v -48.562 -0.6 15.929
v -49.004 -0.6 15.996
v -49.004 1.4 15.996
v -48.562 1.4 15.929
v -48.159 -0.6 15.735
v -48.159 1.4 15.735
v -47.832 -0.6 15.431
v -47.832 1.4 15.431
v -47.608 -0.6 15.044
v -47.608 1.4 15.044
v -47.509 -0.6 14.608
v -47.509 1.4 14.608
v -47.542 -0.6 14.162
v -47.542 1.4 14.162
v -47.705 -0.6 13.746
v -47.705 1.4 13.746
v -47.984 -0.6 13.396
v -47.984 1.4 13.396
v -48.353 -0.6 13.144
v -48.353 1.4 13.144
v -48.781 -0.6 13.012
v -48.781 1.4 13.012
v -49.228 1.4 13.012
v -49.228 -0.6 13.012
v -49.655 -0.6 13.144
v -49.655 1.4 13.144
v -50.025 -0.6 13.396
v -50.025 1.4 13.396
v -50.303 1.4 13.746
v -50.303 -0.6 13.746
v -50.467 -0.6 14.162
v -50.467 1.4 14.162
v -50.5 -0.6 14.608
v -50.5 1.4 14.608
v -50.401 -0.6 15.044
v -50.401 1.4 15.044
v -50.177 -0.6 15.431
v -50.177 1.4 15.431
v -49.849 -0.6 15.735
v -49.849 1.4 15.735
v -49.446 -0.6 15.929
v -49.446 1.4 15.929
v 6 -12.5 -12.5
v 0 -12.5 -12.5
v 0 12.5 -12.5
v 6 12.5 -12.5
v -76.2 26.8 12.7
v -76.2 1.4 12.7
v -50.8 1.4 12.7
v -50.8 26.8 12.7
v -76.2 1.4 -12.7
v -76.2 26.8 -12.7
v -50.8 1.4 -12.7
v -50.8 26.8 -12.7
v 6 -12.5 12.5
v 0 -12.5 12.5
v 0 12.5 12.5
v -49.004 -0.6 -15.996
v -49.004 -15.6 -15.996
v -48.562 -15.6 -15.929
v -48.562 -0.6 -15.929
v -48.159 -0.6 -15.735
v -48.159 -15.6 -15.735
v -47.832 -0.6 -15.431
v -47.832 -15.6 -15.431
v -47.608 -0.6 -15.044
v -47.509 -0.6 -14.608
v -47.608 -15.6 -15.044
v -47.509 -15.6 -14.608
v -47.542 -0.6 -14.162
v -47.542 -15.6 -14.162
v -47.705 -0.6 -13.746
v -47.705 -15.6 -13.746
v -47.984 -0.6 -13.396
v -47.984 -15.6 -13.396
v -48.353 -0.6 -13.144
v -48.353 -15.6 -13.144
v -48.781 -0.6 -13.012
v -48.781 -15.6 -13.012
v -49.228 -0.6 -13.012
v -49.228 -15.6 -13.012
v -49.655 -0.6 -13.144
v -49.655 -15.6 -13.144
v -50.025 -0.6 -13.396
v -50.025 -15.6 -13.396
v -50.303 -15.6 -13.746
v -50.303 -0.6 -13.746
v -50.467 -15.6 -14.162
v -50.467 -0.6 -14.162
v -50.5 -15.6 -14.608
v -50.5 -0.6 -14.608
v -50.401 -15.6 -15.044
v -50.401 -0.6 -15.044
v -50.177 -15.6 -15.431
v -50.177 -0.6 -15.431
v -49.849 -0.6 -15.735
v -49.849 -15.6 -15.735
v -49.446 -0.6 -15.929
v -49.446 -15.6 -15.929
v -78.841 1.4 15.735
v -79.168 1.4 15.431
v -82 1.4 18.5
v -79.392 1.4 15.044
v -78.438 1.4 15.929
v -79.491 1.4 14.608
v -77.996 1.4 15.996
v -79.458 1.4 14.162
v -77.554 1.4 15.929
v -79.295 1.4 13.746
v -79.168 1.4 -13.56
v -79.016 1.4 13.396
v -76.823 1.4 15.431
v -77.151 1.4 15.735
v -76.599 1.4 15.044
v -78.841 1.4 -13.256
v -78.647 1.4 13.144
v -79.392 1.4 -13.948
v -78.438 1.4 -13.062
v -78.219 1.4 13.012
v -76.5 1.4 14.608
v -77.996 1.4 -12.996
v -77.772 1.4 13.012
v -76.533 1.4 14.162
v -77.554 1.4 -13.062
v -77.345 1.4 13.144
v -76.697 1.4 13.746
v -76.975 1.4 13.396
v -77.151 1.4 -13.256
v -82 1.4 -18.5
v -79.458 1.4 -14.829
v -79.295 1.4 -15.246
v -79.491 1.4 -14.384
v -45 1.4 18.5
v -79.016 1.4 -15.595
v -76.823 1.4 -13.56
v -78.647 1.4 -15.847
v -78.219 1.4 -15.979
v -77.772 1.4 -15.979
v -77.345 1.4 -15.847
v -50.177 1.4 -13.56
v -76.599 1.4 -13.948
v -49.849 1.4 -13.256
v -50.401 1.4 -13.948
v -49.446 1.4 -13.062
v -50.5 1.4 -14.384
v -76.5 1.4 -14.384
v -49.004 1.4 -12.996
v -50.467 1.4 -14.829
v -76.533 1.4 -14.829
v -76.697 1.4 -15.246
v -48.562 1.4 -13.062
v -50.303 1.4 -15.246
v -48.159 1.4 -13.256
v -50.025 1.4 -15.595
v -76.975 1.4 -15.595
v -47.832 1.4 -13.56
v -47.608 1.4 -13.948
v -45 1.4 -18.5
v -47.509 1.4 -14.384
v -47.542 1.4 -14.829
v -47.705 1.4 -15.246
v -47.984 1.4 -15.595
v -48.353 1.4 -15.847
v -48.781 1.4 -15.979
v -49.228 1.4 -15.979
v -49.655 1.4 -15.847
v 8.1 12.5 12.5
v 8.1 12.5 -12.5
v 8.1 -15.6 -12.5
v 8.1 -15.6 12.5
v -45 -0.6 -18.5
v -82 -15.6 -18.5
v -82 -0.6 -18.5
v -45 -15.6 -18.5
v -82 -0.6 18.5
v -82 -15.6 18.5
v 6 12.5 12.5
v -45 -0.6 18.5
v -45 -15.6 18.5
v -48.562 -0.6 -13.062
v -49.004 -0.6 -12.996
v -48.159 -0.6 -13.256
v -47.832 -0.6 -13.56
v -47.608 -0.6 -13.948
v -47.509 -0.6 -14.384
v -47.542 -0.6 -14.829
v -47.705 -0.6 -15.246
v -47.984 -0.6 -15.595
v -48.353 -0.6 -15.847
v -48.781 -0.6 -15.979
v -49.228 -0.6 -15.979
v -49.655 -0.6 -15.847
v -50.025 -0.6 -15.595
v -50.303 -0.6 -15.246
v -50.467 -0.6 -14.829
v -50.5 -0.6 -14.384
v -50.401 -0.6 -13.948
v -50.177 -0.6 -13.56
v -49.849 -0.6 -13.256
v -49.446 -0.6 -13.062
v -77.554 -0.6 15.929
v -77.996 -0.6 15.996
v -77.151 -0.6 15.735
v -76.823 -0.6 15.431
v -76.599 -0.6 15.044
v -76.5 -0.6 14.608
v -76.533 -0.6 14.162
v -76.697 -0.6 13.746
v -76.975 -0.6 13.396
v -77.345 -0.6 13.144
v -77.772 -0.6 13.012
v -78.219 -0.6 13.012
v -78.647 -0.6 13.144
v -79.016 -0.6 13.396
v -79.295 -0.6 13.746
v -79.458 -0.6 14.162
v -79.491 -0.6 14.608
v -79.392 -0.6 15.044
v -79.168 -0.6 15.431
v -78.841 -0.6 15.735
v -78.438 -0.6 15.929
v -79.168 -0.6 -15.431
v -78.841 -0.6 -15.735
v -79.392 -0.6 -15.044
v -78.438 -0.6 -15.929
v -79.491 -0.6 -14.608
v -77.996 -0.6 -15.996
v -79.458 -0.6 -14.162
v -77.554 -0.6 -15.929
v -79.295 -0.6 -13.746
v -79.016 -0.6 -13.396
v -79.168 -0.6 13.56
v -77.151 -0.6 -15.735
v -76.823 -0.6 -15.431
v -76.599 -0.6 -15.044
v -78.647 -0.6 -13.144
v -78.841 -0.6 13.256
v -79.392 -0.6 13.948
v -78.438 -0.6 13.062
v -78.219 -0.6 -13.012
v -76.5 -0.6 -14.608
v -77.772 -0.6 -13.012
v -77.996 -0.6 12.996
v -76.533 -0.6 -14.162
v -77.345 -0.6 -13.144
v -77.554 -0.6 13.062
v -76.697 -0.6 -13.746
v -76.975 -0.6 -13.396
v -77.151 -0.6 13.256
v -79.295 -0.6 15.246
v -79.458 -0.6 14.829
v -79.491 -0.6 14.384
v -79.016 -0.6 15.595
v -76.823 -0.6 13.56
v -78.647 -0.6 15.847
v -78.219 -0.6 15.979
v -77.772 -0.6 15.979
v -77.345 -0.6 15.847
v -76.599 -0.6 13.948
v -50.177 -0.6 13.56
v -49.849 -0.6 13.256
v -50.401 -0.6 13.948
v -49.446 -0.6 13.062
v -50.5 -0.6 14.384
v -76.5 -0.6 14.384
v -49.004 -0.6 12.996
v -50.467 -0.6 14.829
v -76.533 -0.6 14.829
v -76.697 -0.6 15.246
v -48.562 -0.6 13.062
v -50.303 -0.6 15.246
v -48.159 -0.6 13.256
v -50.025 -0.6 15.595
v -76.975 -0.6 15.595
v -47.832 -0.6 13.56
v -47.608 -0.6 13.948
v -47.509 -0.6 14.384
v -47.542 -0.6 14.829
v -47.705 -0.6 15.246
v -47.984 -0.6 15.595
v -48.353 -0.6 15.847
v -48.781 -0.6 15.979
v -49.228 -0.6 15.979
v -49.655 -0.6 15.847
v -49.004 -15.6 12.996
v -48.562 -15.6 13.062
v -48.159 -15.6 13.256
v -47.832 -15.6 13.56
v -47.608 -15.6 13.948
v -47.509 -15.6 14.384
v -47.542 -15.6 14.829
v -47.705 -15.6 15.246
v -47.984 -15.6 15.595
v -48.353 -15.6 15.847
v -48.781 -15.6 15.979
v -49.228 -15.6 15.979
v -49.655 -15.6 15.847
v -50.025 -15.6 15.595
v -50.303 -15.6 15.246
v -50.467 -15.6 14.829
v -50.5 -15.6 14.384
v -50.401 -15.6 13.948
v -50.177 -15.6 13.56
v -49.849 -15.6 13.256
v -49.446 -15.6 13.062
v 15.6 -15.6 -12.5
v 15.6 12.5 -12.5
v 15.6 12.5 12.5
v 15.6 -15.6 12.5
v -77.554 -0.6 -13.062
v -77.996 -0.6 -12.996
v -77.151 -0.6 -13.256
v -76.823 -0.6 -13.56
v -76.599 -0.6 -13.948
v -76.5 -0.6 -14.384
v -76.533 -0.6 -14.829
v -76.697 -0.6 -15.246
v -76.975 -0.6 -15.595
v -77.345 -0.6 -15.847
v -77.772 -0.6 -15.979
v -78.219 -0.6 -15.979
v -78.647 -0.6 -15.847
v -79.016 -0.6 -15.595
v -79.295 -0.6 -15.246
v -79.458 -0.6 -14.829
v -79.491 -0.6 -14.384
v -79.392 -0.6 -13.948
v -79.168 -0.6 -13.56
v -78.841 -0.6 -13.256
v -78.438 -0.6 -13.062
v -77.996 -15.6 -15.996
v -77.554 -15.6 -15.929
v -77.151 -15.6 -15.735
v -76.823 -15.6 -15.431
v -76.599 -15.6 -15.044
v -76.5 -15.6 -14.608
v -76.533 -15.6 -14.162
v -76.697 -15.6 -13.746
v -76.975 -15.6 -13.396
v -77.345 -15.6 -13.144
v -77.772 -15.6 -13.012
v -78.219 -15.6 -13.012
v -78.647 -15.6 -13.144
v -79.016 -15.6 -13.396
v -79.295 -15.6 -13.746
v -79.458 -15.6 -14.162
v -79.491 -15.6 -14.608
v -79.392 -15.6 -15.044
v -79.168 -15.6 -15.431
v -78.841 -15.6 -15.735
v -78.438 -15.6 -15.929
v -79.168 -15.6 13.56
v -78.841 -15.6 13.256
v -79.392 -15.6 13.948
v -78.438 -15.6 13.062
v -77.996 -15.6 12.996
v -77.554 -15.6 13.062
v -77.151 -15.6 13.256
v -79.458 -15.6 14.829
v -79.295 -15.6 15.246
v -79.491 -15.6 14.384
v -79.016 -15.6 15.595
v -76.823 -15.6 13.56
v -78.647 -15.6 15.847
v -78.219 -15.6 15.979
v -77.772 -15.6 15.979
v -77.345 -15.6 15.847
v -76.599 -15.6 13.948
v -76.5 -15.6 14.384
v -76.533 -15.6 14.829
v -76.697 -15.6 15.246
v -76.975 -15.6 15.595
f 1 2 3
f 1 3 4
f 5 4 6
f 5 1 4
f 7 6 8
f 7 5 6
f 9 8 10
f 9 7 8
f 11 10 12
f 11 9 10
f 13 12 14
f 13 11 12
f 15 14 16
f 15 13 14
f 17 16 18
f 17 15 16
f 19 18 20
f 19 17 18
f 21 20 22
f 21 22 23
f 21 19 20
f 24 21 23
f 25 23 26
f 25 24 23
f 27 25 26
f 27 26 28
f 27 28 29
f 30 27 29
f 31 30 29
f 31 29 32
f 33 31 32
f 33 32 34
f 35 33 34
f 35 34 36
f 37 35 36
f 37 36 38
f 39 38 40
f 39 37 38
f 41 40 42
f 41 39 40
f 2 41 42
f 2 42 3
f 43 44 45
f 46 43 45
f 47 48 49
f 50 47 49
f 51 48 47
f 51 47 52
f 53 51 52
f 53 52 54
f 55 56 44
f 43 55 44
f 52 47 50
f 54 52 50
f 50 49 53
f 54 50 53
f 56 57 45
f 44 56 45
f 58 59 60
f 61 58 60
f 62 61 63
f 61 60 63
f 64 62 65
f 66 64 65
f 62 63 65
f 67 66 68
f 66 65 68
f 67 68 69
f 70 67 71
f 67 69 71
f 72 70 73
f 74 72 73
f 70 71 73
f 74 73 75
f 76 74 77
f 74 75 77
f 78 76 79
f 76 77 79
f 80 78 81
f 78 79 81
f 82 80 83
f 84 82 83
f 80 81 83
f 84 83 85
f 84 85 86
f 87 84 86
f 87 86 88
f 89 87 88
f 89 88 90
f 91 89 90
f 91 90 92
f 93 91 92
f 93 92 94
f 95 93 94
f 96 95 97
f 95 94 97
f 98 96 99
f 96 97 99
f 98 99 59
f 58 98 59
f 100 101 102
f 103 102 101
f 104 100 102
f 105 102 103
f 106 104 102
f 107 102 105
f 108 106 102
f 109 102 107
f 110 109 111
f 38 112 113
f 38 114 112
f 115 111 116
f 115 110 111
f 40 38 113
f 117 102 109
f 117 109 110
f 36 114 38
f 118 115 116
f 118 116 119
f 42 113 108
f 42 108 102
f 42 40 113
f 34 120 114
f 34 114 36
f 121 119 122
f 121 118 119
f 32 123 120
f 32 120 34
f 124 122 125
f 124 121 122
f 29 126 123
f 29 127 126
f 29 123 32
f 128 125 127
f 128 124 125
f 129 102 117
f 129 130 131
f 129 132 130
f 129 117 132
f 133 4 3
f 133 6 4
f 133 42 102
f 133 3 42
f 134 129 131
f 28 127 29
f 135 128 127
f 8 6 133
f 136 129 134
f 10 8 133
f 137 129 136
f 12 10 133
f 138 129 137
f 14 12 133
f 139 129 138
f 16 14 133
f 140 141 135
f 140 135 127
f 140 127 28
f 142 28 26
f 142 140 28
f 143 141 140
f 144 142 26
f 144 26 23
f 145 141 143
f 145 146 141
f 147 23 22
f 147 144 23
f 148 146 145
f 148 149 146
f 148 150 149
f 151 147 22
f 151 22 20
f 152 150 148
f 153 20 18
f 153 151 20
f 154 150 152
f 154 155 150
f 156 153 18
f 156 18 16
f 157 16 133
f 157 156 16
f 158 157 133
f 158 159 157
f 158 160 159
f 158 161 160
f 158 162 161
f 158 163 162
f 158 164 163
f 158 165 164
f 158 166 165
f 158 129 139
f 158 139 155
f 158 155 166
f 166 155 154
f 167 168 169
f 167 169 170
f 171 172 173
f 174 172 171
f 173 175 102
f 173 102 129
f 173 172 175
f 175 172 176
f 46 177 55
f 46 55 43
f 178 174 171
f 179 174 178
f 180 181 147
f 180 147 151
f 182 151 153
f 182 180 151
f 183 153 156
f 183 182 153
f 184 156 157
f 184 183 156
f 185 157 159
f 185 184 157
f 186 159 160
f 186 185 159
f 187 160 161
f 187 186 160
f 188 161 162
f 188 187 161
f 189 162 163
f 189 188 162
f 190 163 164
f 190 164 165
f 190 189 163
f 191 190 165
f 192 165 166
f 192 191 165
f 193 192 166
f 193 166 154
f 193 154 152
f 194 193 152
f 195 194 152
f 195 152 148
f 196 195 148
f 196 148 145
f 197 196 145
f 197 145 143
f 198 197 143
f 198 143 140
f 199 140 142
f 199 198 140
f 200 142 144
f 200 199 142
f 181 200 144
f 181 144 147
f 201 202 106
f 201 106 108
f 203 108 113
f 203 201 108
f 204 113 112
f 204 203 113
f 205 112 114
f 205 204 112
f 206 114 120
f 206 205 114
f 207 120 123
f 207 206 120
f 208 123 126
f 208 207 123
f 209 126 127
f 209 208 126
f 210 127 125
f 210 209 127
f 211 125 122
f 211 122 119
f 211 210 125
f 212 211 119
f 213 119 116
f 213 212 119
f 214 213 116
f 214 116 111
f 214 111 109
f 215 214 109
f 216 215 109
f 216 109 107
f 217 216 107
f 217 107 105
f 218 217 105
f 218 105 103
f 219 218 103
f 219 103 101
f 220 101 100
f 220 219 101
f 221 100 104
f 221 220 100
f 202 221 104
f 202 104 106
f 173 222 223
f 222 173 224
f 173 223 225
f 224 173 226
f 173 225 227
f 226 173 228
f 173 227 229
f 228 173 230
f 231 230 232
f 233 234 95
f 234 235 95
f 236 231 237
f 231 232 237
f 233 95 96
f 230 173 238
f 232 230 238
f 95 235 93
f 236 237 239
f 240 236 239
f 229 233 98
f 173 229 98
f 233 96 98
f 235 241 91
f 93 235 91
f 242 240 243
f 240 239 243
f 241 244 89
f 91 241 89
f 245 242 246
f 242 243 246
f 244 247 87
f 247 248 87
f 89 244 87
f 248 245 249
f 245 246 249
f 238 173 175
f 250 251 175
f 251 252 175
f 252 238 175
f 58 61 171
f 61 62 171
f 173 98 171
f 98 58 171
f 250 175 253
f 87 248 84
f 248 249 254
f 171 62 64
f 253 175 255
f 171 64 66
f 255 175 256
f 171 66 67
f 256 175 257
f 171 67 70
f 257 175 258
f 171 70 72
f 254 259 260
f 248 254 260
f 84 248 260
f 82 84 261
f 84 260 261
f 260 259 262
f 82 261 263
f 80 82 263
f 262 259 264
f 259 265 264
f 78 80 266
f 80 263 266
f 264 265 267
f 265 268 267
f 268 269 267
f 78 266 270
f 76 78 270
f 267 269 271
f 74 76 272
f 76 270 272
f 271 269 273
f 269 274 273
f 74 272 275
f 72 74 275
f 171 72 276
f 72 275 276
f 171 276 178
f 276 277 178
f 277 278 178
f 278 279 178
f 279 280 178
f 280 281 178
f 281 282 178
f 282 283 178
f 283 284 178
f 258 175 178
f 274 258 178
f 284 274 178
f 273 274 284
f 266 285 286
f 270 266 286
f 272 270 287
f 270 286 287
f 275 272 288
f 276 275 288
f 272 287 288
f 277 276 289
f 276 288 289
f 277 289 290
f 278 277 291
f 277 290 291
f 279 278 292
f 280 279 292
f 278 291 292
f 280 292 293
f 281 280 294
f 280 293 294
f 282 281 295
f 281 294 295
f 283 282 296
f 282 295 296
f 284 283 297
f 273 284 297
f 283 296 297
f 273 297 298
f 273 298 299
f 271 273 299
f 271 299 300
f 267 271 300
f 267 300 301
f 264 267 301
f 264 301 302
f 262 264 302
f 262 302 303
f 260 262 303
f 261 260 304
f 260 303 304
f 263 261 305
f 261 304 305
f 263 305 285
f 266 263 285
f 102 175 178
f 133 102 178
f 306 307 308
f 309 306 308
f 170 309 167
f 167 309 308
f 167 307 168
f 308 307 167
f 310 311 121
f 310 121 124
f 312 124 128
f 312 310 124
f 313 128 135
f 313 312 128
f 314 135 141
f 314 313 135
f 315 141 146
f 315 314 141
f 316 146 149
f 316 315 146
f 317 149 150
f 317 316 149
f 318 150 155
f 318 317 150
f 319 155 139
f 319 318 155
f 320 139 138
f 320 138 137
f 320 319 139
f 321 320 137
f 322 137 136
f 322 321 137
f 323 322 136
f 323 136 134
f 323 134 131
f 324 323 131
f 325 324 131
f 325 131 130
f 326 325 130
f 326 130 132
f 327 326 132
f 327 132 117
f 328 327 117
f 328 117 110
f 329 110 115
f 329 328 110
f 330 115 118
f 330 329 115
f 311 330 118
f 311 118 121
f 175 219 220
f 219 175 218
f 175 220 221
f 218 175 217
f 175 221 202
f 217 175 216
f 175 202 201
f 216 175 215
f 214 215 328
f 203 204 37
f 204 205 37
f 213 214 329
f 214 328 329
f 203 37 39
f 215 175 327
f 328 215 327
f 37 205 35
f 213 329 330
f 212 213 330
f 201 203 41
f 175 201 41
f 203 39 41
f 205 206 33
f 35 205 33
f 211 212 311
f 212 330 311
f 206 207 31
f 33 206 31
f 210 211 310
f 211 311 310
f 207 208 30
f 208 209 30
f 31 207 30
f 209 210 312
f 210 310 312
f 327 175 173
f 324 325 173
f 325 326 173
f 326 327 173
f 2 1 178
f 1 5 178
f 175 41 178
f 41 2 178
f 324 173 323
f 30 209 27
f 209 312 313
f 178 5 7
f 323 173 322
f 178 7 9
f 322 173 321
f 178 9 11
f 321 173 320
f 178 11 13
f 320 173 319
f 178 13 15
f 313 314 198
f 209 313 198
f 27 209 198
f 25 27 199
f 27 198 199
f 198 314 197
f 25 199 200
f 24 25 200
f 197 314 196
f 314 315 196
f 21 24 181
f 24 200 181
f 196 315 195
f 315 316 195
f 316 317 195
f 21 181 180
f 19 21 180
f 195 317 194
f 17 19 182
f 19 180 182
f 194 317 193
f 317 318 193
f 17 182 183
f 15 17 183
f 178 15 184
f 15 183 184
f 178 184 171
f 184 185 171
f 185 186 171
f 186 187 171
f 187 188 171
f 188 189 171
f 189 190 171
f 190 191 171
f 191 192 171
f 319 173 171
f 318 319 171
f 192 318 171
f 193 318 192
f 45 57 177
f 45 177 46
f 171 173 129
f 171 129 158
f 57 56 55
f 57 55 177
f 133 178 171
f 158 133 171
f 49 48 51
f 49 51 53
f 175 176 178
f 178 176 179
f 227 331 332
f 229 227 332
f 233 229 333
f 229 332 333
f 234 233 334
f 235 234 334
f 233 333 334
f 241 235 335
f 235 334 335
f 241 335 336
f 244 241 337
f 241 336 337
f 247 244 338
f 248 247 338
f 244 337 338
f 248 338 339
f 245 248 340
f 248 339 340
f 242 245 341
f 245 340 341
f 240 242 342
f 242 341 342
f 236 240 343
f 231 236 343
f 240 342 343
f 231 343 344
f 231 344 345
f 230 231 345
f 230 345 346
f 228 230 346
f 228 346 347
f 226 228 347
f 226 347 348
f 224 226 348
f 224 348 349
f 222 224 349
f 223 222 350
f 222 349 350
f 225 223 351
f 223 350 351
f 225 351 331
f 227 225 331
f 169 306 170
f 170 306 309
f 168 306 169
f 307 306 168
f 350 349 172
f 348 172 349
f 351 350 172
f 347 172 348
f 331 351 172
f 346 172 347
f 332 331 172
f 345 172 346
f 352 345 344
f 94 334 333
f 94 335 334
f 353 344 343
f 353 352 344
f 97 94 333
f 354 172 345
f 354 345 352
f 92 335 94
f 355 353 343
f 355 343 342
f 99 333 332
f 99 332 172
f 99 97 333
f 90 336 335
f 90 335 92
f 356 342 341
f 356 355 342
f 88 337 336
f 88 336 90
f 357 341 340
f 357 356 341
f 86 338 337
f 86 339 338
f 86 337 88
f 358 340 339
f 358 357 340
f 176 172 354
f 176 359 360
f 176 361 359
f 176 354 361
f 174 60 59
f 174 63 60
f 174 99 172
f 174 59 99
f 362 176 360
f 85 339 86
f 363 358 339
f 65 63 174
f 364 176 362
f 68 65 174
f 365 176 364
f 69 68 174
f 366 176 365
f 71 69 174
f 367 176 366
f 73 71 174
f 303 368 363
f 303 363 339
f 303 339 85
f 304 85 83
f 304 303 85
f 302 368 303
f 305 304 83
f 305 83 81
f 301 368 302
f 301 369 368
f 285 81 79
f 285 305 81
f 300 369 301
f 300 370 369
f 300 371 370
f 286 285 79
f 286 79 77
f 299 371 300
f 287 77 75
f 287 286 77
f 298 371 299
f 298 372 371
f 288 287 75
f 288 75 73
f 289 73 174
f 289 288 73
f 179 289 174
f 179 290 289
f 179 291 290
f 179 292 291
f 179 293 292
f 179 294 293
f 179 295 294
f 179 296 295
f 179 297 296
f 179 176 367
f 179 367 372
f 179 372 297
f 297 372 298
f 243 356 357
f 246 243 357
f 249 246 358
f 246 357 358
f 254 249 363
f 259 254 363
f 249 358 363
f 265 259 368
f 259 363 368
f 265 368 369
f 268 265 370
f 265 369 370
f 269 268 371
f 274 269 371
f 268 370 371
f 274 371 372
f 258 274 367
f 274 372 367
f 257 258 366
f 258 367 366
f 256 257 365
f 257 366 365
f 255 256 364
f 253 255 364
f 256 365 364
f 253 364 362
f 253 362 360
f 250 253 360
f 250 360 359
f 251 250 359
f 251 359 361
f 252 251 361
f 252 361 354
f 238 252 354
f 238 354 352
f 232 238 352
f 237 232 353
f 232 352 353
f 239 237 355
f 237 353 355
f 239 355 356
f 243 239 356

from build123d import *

# Parameters (mm, degrees)
SKETCH1_W           = 25
SKETCH1_H           = 25
BOSS_EXTRUDE1_DEPTH = 6
SKETCH3_W           = 25
SKETCH3_H           = 28.1
BOSS_EXTRUDE2_DEPTH = 7.5
SKETCH11_W          = 37
SKETCH11_H          = 37
SKETCH11_R          = 1.5
BOSS_EXTRUDE4_DEPTH = 15
SKETCH12_W          = 37
SKETCH12_H          = 37
SKETCH12_R          = 1.5
BOSS_EXTRUDE5_DEPTH = 2
SKETCH13_W          = 25.4
SKETCH13_H          = 25.4
BOSS_EXTRUDE6_DEPTH = 25.4


with BuildPart() as part:
    # Sketch1 → Boss-Extrude1 (new body)
    with BuildSketch(Plane(origin=(0, 0, 0), x_dir=(0, 0, -1), z_dir=(1, 0, 0))):
        Rectangle(SKETCH1_W, SKETCH1_H)
    extrude(amount=BOSS_EXTRUDE1_DEPTH)


with BuildPart() as body_2:
    # Sketch3 → Boss-Extrude2 (new body)
    with BuildSketch(Plane.ZY.offset(-15.6)):
        with Locations((0, -1.55)):
            Rectangle(SKETCH3_W, SKETCH3_H)
    extrude(amount=BOSS_EXTRUDE2_DEPTH)


with BuildPart() as body_3:
    # Sketch11 → Boss-Extrude4 (new body)
    with BuildSketch(Plane.XZ.offset(15.6)):
        with Locations((-63.5, 0)):
            Rectangle(SKETCH11_W, SKETCH11_H)
        with Locations(Location((-49.004310986, 14.495689014, 0), (0, 0, 270))):
            Circle(SKETCH11_R, mode=Mode.SUBTRACT)
        with Locations(Location((-49.004310986, -14.495689014, 0), (0, 0, 270))):
            Circle(SKETCH11_R, mode=Mode.SUBTRACT)
        with Locations(Location((-77.995689014, -14.495689014, 0), (0, 0, 270))):
            Circle(SKETCH11_R, mode=Mode.SUBTRACT)
        with Locations(Location((-77.995689014, 14.495689014, 0), (0, 0, 270))):
            Circle(SKETCH11_R, mode=Mode.SUBTRACT)
    extrude(amount=-BOSS_EXTRUDE4_DEPTH)


with BuildPart() as body_4:
    # Sketch12 → Boss-Extrude5 (new body)
    with BuildSketch(Plane(origin=(0, -0.6, 0), x_dir=(1, 0, 0), z_dir=(0, 1, 0))):
        with Locations((-63.5, 0)):
            Rectangle(SKETCH12_W, SKETCH12_H)
        with Locations(Location((-77.995689014, -14.495689014, 0), (0, 0, 270))):
            Circle(SKETCH12_R, mode=Mode.SUBTRACT)
        with Locations(Location((-77.995689014, 14.495689014, 0), (0, 0, 270))):
            Circle(SKETCH12_R, mode=Mode.SUBTRACT)
        with Locations(Location((-49.004310986, 14.495689014, 0), (0, 0, 270))):
            Circle(SKETCH12_R, mode=Mode.SUBTRACT)
        with Locations(Location((-49.004310986, -14.495689014, 0), (0, 0, 270))):
            Circle(SKETCH12_R, mode=Mode.SUBTRACT)
    extrude(amount=BOSS_EXTRUDE5_DEPTH)


with BuildPart() as body_5:
    # Sketch13 → Boss-Extrude6 (new body)
    with BuildSketch(Plane(origin=(0, 1.4, 0), x_dir=(1, 0, 0), z_dir=(0, 1, 0))):
        with Locations((-63.5, 0)):
            Rectangle(SKETCH13_W, SKETCH13_H)
    extrude(amount=BOSS_EXTRUDE6_DEPTH)


solid = Compound([part.part, body_2.part, body_3.part, body_4.part, body_5.part])
